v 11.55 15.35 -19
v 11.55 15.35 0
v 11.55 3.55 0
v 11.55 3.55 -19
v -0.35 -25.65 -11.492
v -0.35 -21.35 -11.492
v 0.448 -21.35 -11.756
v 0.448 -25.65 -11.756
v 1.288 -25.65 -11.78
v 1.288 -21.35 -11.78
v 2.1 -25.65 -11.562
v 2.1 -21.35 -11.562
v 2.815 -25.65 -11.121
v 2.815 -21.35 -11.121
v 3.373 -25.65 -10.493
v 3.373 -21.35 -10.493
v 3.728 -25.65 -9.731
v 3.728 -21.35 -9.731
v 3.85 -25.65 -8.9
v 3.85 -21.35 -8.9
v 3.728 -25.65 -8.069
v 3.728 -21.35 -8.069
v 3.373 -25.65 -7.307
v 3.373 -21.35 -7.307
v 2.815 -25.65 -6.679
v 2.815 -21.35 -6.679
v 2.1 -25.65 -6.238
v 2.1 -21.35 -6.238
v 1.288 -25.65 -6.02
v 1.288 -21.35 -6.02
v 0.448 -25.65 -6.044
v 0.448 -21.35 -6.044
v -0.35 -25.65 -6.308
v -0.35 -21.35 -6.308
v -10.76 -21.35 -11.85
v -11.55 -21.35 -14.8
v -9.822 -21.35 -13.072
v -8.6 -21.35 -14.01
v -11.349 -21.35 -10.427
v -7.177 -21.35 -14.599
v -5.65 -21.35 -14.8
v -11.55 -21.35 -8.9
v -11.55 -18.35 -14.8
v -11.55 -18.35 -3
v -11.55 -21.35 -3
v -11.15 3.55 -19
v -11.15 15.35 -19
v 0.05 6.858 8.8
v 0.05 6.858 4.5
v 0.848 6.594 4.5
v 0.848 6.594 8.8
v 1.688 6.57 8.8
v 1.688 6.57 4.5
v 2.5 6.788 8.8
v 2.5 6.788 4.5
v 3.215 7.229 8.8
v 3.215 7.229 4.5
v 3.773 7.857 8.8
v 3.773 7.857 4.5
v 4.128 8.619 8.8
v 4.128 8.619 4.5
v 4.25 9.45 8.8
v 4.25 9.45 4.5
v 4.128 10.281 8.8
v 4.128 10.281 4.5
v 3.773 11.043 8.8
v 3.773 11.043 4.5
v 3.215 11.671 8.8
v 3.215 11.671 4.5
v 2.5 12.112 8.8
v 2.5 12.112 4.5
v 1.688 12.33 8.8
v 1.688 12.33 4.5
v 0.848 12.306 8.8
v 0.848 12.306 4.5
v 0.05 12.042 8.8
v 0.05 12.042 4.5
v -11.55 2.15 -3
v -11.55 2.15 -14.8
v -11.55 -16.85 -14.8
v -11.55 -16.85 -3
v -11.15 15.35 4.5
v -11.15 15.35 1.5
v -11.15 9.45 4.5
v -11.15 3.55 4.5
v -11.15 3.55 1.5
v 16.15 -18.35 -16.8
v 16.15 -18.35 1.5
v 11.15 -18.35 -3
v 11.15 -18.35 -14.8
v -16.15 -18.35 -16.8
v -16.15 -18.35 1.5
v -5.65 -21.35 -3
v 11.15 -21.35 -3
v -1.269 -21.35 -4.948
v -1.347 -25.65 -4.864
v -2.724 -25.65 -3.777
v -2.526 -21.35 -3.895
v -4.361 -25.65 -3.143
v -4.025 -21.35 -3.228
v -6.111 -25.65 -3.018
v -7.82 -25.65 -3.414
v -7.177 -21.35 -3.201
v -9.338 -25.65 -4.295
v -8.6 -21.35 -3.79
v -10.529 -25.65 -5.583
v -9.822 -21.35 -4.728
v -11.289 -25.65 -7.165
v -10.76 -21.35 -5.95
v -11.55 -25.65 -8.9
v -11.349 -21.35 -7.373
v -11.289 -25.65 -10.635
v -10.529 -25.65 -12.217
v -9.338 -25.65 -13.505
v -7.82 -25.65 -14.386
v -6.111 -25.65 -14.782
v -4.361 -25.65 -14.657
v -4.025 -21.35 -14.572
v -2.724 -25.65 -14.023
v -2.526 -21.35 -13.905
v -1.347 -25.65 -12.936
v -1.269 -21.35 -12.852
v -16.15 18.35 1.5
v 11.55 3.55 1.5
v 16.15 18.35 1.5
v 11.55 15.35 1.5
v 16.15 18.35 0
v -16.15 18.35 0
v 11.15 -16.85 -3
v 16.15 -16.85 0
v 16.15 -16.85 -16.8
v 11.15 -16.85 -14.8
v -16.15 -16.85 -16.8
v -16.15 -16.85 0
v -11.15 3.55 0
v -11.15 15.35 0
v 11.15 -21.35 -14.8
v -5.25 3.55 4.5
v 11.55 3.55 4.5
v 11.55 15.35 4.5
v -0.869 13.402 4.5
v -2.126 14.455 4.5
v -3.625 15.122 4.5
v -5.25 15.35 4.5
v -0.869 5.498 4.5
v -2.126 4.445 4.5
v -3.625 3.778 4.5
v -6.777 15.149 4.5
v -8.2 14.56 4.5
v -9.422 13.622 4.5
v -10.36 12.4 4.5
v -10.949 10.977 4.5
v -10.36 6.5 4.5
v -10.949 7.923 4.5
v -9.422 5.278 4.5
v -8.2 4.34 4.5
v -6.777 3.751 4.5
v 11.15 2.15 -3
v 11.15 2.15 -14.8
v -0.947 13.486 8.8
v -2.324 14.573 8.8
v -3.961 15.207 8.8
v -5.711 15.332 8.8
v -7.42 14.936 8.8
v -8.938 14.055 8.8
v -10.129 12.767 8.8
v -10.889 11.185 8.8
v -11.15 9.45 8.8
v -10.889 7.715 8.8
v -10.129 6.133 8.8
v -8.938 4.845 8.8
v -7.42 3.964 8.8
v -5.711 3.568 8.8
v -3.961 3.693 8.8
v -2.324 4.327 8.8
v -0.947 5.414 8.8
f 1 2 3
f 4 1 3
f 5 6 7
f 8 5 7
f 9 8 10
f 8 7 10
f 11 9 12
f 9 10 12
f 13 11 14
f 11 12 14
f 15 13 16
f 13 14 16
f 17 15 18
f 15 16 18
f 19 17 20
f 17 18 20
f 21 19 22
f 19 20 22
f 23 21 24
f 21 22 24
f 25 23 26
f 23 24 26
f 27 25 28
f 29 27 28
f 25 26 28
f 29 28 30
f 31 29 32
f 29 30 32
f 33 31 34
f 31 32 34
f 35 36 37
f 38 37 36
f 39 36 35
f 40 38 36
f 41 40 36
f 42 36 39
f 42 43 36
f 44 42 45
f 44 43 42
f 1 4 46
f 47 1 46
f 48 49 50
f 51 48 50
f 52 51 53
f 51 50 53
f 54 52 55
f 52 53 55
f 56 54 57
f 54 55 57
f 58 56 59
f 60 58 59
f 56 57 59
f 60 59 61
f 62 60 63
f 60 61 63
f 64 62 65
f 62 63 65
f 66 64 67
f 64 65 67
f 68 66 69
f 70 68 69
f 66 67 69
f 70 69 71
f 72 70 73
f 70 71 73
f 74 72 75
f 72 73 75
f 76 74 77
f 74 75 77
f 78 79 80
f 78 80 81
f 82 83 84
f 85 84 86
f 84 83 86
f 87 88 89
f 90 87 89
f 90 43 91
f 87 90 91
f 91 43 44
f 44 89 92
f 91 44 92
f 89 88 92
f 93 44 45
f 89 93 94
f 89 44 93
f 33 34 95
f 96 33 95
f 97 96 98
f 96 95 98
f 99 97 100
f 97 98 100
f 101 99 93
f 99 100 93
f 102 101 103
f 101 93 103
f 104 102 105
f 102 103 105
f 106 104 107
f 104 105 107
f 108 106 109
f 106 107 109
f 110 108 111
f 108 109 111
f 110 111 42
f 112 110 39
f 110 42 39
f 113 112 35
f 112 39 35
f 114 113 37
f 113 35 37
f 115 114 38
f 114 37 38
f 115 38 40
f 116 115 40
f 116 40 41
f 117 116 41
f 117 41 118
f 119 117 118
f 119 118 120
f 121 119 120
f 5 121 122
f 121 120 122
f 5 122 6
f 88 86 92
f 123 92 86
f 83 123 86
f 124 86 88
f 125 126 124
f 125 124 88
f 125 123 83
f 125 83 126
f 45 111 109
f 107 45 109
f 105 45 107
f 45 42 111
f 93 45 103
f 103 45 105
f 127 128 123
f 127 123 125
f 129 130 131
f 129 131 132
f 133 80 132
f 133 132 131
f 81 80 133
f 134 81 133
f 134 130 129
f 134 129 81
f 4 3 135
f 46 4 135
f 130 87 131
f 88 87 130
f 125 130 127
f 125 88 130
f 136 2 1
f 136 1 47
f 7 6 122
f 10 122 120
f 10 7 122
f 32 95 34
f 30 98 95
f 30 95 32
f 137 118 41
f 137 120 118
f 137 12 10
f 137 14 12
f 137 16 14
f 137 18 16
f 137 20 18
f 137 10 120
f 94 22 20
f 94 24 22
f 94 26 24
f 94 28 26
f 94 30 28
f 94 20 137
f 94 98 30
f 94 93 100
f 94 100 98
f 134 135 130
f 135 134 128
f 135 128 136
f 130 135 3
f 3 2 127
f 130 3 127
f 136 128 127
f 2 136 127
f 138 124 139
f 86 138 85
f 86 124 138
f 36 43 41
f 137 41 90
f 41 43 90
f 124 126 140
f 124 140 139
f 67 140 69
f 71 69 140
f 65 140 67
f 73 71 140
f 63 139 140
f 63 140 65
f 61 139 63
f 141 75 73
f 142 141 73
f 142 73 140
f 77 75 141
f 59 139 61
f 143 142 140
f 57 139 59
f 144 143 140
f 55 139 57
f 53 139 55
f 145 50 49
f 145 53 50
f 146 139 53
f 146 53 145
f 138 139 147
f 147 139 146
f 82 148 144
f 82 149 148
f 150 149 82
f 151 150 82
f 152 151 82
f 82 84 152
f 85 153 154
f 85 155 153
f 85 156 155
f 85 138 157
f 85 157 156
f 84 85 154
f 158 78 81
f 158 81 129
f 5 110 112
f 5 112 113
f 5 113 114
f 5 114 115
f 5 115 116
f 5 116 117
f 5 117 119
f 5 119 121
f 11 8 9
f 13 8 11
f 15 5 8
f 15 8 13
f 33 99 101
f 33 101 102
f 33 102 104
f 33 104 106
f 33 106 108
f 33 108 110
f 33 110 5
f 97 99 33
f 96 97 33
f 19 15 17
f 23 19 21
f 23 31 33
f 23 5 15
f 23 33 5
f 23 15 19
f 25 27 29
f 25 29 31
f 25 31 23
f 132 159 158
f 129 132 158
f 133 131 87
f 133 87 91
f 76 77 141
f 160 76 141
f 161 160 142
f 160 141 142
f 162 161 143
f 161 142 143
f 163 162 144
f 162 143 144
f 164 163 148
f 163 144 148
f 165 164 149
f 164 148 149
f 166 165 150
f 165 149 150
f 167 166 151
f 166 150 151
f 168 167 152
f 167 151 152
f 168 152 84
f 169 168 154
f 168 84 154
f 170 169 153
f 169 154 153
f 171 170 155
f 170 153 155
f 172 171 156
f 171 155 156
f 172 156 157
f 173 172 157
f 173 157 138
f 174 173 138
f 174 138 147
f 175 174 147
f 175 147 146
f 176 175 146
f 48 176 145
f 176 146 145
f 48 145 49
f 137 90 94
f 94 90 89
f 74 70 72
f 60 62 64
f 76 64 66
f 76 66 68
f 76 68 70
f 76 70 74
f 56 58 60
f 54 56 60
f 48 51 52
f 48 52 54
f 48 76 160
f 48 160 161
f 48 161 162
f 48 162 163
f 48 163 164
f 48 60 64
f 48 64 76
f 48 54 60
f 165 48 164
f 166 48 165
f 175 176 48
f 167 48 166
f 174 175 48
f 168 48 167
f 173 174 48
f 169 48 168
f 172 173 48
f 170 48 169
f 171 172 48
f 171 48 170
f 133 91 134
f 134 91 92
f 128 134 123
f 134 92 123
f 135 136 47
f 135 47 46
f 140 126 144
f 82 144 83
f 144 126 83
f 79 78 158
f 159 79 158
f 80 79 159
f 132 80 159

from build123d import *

# Parameters (mm, degrees)
SKETCH1_W           = 32.3
SKETCH1_H           = 36.7
BOSS_EXTRUDE1_DEPTH = 1.5
SKETCH2_W           = 32.3
SKETCH2_H           = 1.5
BOSS_EXTRUDE2_DEPTH = 16.8
SKETCH3_W           = 22.7
SKETCH3_H           = 11.8
BOSS_EXTRUDE3_DEPTH = 3
SKETCH4_R           = 5.9
BOSS_EXTRUDE4_DEPTH = 4.3
SKETCH7_W           = 22.7
SKETCH7_H           = 11.8
BOSS_EXTRUDE6_DEPTH = 3
SKETCH9_R           = 5.9
BOSS_EXTRUDE7_DEPTH = 4.3
BOSS_EXTRUDE8_START = -1.5
SKETCH7_2_W         = 22.7
SKETCH7_2_H         = 11.8
BOSS_EXTRUDE8_DEPTH = 19
BOSS_EXTRUDE9_START = -20.5
SKETCH3_2_W         = 22.7
SKETCH3_2_H         = 11.8
BOSS_EXTRUDE9_DEPTH = 19


with BuildPart() as part:
    # Sketch1 → Boss-Extrude1 (new body)
    with BuildSketch(Plane.XY):
        Rectangle(SKETCH1_W, SKETCH1_H)
    extrude(amount=BOSS_EXTRUDE1_DEPTH)

    # Sketch2 → Boss-Extrude2 (add)
    with BuildSketch(Plane(origin=(0, 0, 0), x_dir=(-1, 0, 0), z_dir=(0, 0, -1))):
        with Locations((0, -17.6)):
            Rectangle(SKETCH2_W, SKETCH2_H)
    extrude(amount=BOSS_EXTRUDE2_DEPTH)

    # Sketch3 → Boss-Extrude3 (add)
    with BuildSketch(Plane.XZ.offset(18.35)):
        with Locations((-0.2, -8.9)):
            Rectangle(SKETCH3_W, SKETCH3_H)
    extrude(amount=BOSS_EXTRUDE3_DEPTH)

    # Sketch4 → Boss-Extrude4 (add)
    with BuildSketch(Plane.XZ.offset(21.35)):
        with BuildLine():
            ThreePointArc((-0.35, -6.307703721), (0.098043145, -7.56958653), (0.25, -8.9))
            ThreePointArc((0.25, -8.9), (0.098043145, -10.23041347), (-0.35, -11.492296279))
            ThreePointArc((-0.35, -11.492296279), (3.85, -8.9), (-0.35, -6.307703721))
        make_face()
        with Locations((-5.65, -8.9)):
            Circle(SKETCH4_R)
    extrude(amount=BOSS_EXTRUDE4_DEPTH)

    # Sketch7 → Boss-Extrude6 (add)
    with BuildSketch(Plane(origin=(-13.214346586, -22.528065204, 1.5), x_dir=(-1, 0, 0), z_dir=(0, 0, 1))):
        with Locations((-13.414346586, -31.978065204)):
            Rectangle(SKETCH7_W, SKETCH7_H)
    extrude(amount=BOSS_EXTRUDE6_DEPTH)

    # Sketch9 → Boss-Extrude7 (add)
    with BuildSketch(Plane(origin=(-13.214346586, -22.528065204, 4.5), x_dir=(-1, 0, 0), z_dir=(0, 0, 1))):
        with Locations((-7.964346586, -31.978065204)):
            Circle(SKETCH9_R)
        with BuildLine():
            ThreePointArc((-13.264346586, -34.570361484), (-13.864346586, -31.978065204), (-13.264346586, -29.385768925))
            ThreePointArc((-13.264346586, -29.385768925), (-17.464346586, -31.978065204), (-13.264346586, -34.570361484))
        make_face()
    extrude(amount=BOSS_EXTRUDE7_DEPTH)

    # Sketch7<2> → Boss-Extrude8 (add)
    with BuildSketch(Plane(origin=(-13.214346586, -22.528065204, 1.5), x_dir=(-1, 0, 0), z_dir=(0, 0, 1)).offset(BOSS_EXTRUDE8_START)):
        with Locations((-13.414346586, -31.978065204)):
            Rectangle(SKETCH7_2_W, SKETCH7_2_H)
    extrude(amount=-BOSS_EXTRUDE8_DEPTH)

    # Sketch3<2> → Boss-Extrude9 (add)
    with BuildSketch(Plane.XZ.offset(18.35).offset(BOSS_EXTRUDE9_START)):
        with Locations((-0.2, -8.9)):
            Rectangle(SKETCH3_2_W, SKETCH3_2_H)
    extrude(amount=BOSS_EXTRUDE9_DEPTH)


solid = part.part
